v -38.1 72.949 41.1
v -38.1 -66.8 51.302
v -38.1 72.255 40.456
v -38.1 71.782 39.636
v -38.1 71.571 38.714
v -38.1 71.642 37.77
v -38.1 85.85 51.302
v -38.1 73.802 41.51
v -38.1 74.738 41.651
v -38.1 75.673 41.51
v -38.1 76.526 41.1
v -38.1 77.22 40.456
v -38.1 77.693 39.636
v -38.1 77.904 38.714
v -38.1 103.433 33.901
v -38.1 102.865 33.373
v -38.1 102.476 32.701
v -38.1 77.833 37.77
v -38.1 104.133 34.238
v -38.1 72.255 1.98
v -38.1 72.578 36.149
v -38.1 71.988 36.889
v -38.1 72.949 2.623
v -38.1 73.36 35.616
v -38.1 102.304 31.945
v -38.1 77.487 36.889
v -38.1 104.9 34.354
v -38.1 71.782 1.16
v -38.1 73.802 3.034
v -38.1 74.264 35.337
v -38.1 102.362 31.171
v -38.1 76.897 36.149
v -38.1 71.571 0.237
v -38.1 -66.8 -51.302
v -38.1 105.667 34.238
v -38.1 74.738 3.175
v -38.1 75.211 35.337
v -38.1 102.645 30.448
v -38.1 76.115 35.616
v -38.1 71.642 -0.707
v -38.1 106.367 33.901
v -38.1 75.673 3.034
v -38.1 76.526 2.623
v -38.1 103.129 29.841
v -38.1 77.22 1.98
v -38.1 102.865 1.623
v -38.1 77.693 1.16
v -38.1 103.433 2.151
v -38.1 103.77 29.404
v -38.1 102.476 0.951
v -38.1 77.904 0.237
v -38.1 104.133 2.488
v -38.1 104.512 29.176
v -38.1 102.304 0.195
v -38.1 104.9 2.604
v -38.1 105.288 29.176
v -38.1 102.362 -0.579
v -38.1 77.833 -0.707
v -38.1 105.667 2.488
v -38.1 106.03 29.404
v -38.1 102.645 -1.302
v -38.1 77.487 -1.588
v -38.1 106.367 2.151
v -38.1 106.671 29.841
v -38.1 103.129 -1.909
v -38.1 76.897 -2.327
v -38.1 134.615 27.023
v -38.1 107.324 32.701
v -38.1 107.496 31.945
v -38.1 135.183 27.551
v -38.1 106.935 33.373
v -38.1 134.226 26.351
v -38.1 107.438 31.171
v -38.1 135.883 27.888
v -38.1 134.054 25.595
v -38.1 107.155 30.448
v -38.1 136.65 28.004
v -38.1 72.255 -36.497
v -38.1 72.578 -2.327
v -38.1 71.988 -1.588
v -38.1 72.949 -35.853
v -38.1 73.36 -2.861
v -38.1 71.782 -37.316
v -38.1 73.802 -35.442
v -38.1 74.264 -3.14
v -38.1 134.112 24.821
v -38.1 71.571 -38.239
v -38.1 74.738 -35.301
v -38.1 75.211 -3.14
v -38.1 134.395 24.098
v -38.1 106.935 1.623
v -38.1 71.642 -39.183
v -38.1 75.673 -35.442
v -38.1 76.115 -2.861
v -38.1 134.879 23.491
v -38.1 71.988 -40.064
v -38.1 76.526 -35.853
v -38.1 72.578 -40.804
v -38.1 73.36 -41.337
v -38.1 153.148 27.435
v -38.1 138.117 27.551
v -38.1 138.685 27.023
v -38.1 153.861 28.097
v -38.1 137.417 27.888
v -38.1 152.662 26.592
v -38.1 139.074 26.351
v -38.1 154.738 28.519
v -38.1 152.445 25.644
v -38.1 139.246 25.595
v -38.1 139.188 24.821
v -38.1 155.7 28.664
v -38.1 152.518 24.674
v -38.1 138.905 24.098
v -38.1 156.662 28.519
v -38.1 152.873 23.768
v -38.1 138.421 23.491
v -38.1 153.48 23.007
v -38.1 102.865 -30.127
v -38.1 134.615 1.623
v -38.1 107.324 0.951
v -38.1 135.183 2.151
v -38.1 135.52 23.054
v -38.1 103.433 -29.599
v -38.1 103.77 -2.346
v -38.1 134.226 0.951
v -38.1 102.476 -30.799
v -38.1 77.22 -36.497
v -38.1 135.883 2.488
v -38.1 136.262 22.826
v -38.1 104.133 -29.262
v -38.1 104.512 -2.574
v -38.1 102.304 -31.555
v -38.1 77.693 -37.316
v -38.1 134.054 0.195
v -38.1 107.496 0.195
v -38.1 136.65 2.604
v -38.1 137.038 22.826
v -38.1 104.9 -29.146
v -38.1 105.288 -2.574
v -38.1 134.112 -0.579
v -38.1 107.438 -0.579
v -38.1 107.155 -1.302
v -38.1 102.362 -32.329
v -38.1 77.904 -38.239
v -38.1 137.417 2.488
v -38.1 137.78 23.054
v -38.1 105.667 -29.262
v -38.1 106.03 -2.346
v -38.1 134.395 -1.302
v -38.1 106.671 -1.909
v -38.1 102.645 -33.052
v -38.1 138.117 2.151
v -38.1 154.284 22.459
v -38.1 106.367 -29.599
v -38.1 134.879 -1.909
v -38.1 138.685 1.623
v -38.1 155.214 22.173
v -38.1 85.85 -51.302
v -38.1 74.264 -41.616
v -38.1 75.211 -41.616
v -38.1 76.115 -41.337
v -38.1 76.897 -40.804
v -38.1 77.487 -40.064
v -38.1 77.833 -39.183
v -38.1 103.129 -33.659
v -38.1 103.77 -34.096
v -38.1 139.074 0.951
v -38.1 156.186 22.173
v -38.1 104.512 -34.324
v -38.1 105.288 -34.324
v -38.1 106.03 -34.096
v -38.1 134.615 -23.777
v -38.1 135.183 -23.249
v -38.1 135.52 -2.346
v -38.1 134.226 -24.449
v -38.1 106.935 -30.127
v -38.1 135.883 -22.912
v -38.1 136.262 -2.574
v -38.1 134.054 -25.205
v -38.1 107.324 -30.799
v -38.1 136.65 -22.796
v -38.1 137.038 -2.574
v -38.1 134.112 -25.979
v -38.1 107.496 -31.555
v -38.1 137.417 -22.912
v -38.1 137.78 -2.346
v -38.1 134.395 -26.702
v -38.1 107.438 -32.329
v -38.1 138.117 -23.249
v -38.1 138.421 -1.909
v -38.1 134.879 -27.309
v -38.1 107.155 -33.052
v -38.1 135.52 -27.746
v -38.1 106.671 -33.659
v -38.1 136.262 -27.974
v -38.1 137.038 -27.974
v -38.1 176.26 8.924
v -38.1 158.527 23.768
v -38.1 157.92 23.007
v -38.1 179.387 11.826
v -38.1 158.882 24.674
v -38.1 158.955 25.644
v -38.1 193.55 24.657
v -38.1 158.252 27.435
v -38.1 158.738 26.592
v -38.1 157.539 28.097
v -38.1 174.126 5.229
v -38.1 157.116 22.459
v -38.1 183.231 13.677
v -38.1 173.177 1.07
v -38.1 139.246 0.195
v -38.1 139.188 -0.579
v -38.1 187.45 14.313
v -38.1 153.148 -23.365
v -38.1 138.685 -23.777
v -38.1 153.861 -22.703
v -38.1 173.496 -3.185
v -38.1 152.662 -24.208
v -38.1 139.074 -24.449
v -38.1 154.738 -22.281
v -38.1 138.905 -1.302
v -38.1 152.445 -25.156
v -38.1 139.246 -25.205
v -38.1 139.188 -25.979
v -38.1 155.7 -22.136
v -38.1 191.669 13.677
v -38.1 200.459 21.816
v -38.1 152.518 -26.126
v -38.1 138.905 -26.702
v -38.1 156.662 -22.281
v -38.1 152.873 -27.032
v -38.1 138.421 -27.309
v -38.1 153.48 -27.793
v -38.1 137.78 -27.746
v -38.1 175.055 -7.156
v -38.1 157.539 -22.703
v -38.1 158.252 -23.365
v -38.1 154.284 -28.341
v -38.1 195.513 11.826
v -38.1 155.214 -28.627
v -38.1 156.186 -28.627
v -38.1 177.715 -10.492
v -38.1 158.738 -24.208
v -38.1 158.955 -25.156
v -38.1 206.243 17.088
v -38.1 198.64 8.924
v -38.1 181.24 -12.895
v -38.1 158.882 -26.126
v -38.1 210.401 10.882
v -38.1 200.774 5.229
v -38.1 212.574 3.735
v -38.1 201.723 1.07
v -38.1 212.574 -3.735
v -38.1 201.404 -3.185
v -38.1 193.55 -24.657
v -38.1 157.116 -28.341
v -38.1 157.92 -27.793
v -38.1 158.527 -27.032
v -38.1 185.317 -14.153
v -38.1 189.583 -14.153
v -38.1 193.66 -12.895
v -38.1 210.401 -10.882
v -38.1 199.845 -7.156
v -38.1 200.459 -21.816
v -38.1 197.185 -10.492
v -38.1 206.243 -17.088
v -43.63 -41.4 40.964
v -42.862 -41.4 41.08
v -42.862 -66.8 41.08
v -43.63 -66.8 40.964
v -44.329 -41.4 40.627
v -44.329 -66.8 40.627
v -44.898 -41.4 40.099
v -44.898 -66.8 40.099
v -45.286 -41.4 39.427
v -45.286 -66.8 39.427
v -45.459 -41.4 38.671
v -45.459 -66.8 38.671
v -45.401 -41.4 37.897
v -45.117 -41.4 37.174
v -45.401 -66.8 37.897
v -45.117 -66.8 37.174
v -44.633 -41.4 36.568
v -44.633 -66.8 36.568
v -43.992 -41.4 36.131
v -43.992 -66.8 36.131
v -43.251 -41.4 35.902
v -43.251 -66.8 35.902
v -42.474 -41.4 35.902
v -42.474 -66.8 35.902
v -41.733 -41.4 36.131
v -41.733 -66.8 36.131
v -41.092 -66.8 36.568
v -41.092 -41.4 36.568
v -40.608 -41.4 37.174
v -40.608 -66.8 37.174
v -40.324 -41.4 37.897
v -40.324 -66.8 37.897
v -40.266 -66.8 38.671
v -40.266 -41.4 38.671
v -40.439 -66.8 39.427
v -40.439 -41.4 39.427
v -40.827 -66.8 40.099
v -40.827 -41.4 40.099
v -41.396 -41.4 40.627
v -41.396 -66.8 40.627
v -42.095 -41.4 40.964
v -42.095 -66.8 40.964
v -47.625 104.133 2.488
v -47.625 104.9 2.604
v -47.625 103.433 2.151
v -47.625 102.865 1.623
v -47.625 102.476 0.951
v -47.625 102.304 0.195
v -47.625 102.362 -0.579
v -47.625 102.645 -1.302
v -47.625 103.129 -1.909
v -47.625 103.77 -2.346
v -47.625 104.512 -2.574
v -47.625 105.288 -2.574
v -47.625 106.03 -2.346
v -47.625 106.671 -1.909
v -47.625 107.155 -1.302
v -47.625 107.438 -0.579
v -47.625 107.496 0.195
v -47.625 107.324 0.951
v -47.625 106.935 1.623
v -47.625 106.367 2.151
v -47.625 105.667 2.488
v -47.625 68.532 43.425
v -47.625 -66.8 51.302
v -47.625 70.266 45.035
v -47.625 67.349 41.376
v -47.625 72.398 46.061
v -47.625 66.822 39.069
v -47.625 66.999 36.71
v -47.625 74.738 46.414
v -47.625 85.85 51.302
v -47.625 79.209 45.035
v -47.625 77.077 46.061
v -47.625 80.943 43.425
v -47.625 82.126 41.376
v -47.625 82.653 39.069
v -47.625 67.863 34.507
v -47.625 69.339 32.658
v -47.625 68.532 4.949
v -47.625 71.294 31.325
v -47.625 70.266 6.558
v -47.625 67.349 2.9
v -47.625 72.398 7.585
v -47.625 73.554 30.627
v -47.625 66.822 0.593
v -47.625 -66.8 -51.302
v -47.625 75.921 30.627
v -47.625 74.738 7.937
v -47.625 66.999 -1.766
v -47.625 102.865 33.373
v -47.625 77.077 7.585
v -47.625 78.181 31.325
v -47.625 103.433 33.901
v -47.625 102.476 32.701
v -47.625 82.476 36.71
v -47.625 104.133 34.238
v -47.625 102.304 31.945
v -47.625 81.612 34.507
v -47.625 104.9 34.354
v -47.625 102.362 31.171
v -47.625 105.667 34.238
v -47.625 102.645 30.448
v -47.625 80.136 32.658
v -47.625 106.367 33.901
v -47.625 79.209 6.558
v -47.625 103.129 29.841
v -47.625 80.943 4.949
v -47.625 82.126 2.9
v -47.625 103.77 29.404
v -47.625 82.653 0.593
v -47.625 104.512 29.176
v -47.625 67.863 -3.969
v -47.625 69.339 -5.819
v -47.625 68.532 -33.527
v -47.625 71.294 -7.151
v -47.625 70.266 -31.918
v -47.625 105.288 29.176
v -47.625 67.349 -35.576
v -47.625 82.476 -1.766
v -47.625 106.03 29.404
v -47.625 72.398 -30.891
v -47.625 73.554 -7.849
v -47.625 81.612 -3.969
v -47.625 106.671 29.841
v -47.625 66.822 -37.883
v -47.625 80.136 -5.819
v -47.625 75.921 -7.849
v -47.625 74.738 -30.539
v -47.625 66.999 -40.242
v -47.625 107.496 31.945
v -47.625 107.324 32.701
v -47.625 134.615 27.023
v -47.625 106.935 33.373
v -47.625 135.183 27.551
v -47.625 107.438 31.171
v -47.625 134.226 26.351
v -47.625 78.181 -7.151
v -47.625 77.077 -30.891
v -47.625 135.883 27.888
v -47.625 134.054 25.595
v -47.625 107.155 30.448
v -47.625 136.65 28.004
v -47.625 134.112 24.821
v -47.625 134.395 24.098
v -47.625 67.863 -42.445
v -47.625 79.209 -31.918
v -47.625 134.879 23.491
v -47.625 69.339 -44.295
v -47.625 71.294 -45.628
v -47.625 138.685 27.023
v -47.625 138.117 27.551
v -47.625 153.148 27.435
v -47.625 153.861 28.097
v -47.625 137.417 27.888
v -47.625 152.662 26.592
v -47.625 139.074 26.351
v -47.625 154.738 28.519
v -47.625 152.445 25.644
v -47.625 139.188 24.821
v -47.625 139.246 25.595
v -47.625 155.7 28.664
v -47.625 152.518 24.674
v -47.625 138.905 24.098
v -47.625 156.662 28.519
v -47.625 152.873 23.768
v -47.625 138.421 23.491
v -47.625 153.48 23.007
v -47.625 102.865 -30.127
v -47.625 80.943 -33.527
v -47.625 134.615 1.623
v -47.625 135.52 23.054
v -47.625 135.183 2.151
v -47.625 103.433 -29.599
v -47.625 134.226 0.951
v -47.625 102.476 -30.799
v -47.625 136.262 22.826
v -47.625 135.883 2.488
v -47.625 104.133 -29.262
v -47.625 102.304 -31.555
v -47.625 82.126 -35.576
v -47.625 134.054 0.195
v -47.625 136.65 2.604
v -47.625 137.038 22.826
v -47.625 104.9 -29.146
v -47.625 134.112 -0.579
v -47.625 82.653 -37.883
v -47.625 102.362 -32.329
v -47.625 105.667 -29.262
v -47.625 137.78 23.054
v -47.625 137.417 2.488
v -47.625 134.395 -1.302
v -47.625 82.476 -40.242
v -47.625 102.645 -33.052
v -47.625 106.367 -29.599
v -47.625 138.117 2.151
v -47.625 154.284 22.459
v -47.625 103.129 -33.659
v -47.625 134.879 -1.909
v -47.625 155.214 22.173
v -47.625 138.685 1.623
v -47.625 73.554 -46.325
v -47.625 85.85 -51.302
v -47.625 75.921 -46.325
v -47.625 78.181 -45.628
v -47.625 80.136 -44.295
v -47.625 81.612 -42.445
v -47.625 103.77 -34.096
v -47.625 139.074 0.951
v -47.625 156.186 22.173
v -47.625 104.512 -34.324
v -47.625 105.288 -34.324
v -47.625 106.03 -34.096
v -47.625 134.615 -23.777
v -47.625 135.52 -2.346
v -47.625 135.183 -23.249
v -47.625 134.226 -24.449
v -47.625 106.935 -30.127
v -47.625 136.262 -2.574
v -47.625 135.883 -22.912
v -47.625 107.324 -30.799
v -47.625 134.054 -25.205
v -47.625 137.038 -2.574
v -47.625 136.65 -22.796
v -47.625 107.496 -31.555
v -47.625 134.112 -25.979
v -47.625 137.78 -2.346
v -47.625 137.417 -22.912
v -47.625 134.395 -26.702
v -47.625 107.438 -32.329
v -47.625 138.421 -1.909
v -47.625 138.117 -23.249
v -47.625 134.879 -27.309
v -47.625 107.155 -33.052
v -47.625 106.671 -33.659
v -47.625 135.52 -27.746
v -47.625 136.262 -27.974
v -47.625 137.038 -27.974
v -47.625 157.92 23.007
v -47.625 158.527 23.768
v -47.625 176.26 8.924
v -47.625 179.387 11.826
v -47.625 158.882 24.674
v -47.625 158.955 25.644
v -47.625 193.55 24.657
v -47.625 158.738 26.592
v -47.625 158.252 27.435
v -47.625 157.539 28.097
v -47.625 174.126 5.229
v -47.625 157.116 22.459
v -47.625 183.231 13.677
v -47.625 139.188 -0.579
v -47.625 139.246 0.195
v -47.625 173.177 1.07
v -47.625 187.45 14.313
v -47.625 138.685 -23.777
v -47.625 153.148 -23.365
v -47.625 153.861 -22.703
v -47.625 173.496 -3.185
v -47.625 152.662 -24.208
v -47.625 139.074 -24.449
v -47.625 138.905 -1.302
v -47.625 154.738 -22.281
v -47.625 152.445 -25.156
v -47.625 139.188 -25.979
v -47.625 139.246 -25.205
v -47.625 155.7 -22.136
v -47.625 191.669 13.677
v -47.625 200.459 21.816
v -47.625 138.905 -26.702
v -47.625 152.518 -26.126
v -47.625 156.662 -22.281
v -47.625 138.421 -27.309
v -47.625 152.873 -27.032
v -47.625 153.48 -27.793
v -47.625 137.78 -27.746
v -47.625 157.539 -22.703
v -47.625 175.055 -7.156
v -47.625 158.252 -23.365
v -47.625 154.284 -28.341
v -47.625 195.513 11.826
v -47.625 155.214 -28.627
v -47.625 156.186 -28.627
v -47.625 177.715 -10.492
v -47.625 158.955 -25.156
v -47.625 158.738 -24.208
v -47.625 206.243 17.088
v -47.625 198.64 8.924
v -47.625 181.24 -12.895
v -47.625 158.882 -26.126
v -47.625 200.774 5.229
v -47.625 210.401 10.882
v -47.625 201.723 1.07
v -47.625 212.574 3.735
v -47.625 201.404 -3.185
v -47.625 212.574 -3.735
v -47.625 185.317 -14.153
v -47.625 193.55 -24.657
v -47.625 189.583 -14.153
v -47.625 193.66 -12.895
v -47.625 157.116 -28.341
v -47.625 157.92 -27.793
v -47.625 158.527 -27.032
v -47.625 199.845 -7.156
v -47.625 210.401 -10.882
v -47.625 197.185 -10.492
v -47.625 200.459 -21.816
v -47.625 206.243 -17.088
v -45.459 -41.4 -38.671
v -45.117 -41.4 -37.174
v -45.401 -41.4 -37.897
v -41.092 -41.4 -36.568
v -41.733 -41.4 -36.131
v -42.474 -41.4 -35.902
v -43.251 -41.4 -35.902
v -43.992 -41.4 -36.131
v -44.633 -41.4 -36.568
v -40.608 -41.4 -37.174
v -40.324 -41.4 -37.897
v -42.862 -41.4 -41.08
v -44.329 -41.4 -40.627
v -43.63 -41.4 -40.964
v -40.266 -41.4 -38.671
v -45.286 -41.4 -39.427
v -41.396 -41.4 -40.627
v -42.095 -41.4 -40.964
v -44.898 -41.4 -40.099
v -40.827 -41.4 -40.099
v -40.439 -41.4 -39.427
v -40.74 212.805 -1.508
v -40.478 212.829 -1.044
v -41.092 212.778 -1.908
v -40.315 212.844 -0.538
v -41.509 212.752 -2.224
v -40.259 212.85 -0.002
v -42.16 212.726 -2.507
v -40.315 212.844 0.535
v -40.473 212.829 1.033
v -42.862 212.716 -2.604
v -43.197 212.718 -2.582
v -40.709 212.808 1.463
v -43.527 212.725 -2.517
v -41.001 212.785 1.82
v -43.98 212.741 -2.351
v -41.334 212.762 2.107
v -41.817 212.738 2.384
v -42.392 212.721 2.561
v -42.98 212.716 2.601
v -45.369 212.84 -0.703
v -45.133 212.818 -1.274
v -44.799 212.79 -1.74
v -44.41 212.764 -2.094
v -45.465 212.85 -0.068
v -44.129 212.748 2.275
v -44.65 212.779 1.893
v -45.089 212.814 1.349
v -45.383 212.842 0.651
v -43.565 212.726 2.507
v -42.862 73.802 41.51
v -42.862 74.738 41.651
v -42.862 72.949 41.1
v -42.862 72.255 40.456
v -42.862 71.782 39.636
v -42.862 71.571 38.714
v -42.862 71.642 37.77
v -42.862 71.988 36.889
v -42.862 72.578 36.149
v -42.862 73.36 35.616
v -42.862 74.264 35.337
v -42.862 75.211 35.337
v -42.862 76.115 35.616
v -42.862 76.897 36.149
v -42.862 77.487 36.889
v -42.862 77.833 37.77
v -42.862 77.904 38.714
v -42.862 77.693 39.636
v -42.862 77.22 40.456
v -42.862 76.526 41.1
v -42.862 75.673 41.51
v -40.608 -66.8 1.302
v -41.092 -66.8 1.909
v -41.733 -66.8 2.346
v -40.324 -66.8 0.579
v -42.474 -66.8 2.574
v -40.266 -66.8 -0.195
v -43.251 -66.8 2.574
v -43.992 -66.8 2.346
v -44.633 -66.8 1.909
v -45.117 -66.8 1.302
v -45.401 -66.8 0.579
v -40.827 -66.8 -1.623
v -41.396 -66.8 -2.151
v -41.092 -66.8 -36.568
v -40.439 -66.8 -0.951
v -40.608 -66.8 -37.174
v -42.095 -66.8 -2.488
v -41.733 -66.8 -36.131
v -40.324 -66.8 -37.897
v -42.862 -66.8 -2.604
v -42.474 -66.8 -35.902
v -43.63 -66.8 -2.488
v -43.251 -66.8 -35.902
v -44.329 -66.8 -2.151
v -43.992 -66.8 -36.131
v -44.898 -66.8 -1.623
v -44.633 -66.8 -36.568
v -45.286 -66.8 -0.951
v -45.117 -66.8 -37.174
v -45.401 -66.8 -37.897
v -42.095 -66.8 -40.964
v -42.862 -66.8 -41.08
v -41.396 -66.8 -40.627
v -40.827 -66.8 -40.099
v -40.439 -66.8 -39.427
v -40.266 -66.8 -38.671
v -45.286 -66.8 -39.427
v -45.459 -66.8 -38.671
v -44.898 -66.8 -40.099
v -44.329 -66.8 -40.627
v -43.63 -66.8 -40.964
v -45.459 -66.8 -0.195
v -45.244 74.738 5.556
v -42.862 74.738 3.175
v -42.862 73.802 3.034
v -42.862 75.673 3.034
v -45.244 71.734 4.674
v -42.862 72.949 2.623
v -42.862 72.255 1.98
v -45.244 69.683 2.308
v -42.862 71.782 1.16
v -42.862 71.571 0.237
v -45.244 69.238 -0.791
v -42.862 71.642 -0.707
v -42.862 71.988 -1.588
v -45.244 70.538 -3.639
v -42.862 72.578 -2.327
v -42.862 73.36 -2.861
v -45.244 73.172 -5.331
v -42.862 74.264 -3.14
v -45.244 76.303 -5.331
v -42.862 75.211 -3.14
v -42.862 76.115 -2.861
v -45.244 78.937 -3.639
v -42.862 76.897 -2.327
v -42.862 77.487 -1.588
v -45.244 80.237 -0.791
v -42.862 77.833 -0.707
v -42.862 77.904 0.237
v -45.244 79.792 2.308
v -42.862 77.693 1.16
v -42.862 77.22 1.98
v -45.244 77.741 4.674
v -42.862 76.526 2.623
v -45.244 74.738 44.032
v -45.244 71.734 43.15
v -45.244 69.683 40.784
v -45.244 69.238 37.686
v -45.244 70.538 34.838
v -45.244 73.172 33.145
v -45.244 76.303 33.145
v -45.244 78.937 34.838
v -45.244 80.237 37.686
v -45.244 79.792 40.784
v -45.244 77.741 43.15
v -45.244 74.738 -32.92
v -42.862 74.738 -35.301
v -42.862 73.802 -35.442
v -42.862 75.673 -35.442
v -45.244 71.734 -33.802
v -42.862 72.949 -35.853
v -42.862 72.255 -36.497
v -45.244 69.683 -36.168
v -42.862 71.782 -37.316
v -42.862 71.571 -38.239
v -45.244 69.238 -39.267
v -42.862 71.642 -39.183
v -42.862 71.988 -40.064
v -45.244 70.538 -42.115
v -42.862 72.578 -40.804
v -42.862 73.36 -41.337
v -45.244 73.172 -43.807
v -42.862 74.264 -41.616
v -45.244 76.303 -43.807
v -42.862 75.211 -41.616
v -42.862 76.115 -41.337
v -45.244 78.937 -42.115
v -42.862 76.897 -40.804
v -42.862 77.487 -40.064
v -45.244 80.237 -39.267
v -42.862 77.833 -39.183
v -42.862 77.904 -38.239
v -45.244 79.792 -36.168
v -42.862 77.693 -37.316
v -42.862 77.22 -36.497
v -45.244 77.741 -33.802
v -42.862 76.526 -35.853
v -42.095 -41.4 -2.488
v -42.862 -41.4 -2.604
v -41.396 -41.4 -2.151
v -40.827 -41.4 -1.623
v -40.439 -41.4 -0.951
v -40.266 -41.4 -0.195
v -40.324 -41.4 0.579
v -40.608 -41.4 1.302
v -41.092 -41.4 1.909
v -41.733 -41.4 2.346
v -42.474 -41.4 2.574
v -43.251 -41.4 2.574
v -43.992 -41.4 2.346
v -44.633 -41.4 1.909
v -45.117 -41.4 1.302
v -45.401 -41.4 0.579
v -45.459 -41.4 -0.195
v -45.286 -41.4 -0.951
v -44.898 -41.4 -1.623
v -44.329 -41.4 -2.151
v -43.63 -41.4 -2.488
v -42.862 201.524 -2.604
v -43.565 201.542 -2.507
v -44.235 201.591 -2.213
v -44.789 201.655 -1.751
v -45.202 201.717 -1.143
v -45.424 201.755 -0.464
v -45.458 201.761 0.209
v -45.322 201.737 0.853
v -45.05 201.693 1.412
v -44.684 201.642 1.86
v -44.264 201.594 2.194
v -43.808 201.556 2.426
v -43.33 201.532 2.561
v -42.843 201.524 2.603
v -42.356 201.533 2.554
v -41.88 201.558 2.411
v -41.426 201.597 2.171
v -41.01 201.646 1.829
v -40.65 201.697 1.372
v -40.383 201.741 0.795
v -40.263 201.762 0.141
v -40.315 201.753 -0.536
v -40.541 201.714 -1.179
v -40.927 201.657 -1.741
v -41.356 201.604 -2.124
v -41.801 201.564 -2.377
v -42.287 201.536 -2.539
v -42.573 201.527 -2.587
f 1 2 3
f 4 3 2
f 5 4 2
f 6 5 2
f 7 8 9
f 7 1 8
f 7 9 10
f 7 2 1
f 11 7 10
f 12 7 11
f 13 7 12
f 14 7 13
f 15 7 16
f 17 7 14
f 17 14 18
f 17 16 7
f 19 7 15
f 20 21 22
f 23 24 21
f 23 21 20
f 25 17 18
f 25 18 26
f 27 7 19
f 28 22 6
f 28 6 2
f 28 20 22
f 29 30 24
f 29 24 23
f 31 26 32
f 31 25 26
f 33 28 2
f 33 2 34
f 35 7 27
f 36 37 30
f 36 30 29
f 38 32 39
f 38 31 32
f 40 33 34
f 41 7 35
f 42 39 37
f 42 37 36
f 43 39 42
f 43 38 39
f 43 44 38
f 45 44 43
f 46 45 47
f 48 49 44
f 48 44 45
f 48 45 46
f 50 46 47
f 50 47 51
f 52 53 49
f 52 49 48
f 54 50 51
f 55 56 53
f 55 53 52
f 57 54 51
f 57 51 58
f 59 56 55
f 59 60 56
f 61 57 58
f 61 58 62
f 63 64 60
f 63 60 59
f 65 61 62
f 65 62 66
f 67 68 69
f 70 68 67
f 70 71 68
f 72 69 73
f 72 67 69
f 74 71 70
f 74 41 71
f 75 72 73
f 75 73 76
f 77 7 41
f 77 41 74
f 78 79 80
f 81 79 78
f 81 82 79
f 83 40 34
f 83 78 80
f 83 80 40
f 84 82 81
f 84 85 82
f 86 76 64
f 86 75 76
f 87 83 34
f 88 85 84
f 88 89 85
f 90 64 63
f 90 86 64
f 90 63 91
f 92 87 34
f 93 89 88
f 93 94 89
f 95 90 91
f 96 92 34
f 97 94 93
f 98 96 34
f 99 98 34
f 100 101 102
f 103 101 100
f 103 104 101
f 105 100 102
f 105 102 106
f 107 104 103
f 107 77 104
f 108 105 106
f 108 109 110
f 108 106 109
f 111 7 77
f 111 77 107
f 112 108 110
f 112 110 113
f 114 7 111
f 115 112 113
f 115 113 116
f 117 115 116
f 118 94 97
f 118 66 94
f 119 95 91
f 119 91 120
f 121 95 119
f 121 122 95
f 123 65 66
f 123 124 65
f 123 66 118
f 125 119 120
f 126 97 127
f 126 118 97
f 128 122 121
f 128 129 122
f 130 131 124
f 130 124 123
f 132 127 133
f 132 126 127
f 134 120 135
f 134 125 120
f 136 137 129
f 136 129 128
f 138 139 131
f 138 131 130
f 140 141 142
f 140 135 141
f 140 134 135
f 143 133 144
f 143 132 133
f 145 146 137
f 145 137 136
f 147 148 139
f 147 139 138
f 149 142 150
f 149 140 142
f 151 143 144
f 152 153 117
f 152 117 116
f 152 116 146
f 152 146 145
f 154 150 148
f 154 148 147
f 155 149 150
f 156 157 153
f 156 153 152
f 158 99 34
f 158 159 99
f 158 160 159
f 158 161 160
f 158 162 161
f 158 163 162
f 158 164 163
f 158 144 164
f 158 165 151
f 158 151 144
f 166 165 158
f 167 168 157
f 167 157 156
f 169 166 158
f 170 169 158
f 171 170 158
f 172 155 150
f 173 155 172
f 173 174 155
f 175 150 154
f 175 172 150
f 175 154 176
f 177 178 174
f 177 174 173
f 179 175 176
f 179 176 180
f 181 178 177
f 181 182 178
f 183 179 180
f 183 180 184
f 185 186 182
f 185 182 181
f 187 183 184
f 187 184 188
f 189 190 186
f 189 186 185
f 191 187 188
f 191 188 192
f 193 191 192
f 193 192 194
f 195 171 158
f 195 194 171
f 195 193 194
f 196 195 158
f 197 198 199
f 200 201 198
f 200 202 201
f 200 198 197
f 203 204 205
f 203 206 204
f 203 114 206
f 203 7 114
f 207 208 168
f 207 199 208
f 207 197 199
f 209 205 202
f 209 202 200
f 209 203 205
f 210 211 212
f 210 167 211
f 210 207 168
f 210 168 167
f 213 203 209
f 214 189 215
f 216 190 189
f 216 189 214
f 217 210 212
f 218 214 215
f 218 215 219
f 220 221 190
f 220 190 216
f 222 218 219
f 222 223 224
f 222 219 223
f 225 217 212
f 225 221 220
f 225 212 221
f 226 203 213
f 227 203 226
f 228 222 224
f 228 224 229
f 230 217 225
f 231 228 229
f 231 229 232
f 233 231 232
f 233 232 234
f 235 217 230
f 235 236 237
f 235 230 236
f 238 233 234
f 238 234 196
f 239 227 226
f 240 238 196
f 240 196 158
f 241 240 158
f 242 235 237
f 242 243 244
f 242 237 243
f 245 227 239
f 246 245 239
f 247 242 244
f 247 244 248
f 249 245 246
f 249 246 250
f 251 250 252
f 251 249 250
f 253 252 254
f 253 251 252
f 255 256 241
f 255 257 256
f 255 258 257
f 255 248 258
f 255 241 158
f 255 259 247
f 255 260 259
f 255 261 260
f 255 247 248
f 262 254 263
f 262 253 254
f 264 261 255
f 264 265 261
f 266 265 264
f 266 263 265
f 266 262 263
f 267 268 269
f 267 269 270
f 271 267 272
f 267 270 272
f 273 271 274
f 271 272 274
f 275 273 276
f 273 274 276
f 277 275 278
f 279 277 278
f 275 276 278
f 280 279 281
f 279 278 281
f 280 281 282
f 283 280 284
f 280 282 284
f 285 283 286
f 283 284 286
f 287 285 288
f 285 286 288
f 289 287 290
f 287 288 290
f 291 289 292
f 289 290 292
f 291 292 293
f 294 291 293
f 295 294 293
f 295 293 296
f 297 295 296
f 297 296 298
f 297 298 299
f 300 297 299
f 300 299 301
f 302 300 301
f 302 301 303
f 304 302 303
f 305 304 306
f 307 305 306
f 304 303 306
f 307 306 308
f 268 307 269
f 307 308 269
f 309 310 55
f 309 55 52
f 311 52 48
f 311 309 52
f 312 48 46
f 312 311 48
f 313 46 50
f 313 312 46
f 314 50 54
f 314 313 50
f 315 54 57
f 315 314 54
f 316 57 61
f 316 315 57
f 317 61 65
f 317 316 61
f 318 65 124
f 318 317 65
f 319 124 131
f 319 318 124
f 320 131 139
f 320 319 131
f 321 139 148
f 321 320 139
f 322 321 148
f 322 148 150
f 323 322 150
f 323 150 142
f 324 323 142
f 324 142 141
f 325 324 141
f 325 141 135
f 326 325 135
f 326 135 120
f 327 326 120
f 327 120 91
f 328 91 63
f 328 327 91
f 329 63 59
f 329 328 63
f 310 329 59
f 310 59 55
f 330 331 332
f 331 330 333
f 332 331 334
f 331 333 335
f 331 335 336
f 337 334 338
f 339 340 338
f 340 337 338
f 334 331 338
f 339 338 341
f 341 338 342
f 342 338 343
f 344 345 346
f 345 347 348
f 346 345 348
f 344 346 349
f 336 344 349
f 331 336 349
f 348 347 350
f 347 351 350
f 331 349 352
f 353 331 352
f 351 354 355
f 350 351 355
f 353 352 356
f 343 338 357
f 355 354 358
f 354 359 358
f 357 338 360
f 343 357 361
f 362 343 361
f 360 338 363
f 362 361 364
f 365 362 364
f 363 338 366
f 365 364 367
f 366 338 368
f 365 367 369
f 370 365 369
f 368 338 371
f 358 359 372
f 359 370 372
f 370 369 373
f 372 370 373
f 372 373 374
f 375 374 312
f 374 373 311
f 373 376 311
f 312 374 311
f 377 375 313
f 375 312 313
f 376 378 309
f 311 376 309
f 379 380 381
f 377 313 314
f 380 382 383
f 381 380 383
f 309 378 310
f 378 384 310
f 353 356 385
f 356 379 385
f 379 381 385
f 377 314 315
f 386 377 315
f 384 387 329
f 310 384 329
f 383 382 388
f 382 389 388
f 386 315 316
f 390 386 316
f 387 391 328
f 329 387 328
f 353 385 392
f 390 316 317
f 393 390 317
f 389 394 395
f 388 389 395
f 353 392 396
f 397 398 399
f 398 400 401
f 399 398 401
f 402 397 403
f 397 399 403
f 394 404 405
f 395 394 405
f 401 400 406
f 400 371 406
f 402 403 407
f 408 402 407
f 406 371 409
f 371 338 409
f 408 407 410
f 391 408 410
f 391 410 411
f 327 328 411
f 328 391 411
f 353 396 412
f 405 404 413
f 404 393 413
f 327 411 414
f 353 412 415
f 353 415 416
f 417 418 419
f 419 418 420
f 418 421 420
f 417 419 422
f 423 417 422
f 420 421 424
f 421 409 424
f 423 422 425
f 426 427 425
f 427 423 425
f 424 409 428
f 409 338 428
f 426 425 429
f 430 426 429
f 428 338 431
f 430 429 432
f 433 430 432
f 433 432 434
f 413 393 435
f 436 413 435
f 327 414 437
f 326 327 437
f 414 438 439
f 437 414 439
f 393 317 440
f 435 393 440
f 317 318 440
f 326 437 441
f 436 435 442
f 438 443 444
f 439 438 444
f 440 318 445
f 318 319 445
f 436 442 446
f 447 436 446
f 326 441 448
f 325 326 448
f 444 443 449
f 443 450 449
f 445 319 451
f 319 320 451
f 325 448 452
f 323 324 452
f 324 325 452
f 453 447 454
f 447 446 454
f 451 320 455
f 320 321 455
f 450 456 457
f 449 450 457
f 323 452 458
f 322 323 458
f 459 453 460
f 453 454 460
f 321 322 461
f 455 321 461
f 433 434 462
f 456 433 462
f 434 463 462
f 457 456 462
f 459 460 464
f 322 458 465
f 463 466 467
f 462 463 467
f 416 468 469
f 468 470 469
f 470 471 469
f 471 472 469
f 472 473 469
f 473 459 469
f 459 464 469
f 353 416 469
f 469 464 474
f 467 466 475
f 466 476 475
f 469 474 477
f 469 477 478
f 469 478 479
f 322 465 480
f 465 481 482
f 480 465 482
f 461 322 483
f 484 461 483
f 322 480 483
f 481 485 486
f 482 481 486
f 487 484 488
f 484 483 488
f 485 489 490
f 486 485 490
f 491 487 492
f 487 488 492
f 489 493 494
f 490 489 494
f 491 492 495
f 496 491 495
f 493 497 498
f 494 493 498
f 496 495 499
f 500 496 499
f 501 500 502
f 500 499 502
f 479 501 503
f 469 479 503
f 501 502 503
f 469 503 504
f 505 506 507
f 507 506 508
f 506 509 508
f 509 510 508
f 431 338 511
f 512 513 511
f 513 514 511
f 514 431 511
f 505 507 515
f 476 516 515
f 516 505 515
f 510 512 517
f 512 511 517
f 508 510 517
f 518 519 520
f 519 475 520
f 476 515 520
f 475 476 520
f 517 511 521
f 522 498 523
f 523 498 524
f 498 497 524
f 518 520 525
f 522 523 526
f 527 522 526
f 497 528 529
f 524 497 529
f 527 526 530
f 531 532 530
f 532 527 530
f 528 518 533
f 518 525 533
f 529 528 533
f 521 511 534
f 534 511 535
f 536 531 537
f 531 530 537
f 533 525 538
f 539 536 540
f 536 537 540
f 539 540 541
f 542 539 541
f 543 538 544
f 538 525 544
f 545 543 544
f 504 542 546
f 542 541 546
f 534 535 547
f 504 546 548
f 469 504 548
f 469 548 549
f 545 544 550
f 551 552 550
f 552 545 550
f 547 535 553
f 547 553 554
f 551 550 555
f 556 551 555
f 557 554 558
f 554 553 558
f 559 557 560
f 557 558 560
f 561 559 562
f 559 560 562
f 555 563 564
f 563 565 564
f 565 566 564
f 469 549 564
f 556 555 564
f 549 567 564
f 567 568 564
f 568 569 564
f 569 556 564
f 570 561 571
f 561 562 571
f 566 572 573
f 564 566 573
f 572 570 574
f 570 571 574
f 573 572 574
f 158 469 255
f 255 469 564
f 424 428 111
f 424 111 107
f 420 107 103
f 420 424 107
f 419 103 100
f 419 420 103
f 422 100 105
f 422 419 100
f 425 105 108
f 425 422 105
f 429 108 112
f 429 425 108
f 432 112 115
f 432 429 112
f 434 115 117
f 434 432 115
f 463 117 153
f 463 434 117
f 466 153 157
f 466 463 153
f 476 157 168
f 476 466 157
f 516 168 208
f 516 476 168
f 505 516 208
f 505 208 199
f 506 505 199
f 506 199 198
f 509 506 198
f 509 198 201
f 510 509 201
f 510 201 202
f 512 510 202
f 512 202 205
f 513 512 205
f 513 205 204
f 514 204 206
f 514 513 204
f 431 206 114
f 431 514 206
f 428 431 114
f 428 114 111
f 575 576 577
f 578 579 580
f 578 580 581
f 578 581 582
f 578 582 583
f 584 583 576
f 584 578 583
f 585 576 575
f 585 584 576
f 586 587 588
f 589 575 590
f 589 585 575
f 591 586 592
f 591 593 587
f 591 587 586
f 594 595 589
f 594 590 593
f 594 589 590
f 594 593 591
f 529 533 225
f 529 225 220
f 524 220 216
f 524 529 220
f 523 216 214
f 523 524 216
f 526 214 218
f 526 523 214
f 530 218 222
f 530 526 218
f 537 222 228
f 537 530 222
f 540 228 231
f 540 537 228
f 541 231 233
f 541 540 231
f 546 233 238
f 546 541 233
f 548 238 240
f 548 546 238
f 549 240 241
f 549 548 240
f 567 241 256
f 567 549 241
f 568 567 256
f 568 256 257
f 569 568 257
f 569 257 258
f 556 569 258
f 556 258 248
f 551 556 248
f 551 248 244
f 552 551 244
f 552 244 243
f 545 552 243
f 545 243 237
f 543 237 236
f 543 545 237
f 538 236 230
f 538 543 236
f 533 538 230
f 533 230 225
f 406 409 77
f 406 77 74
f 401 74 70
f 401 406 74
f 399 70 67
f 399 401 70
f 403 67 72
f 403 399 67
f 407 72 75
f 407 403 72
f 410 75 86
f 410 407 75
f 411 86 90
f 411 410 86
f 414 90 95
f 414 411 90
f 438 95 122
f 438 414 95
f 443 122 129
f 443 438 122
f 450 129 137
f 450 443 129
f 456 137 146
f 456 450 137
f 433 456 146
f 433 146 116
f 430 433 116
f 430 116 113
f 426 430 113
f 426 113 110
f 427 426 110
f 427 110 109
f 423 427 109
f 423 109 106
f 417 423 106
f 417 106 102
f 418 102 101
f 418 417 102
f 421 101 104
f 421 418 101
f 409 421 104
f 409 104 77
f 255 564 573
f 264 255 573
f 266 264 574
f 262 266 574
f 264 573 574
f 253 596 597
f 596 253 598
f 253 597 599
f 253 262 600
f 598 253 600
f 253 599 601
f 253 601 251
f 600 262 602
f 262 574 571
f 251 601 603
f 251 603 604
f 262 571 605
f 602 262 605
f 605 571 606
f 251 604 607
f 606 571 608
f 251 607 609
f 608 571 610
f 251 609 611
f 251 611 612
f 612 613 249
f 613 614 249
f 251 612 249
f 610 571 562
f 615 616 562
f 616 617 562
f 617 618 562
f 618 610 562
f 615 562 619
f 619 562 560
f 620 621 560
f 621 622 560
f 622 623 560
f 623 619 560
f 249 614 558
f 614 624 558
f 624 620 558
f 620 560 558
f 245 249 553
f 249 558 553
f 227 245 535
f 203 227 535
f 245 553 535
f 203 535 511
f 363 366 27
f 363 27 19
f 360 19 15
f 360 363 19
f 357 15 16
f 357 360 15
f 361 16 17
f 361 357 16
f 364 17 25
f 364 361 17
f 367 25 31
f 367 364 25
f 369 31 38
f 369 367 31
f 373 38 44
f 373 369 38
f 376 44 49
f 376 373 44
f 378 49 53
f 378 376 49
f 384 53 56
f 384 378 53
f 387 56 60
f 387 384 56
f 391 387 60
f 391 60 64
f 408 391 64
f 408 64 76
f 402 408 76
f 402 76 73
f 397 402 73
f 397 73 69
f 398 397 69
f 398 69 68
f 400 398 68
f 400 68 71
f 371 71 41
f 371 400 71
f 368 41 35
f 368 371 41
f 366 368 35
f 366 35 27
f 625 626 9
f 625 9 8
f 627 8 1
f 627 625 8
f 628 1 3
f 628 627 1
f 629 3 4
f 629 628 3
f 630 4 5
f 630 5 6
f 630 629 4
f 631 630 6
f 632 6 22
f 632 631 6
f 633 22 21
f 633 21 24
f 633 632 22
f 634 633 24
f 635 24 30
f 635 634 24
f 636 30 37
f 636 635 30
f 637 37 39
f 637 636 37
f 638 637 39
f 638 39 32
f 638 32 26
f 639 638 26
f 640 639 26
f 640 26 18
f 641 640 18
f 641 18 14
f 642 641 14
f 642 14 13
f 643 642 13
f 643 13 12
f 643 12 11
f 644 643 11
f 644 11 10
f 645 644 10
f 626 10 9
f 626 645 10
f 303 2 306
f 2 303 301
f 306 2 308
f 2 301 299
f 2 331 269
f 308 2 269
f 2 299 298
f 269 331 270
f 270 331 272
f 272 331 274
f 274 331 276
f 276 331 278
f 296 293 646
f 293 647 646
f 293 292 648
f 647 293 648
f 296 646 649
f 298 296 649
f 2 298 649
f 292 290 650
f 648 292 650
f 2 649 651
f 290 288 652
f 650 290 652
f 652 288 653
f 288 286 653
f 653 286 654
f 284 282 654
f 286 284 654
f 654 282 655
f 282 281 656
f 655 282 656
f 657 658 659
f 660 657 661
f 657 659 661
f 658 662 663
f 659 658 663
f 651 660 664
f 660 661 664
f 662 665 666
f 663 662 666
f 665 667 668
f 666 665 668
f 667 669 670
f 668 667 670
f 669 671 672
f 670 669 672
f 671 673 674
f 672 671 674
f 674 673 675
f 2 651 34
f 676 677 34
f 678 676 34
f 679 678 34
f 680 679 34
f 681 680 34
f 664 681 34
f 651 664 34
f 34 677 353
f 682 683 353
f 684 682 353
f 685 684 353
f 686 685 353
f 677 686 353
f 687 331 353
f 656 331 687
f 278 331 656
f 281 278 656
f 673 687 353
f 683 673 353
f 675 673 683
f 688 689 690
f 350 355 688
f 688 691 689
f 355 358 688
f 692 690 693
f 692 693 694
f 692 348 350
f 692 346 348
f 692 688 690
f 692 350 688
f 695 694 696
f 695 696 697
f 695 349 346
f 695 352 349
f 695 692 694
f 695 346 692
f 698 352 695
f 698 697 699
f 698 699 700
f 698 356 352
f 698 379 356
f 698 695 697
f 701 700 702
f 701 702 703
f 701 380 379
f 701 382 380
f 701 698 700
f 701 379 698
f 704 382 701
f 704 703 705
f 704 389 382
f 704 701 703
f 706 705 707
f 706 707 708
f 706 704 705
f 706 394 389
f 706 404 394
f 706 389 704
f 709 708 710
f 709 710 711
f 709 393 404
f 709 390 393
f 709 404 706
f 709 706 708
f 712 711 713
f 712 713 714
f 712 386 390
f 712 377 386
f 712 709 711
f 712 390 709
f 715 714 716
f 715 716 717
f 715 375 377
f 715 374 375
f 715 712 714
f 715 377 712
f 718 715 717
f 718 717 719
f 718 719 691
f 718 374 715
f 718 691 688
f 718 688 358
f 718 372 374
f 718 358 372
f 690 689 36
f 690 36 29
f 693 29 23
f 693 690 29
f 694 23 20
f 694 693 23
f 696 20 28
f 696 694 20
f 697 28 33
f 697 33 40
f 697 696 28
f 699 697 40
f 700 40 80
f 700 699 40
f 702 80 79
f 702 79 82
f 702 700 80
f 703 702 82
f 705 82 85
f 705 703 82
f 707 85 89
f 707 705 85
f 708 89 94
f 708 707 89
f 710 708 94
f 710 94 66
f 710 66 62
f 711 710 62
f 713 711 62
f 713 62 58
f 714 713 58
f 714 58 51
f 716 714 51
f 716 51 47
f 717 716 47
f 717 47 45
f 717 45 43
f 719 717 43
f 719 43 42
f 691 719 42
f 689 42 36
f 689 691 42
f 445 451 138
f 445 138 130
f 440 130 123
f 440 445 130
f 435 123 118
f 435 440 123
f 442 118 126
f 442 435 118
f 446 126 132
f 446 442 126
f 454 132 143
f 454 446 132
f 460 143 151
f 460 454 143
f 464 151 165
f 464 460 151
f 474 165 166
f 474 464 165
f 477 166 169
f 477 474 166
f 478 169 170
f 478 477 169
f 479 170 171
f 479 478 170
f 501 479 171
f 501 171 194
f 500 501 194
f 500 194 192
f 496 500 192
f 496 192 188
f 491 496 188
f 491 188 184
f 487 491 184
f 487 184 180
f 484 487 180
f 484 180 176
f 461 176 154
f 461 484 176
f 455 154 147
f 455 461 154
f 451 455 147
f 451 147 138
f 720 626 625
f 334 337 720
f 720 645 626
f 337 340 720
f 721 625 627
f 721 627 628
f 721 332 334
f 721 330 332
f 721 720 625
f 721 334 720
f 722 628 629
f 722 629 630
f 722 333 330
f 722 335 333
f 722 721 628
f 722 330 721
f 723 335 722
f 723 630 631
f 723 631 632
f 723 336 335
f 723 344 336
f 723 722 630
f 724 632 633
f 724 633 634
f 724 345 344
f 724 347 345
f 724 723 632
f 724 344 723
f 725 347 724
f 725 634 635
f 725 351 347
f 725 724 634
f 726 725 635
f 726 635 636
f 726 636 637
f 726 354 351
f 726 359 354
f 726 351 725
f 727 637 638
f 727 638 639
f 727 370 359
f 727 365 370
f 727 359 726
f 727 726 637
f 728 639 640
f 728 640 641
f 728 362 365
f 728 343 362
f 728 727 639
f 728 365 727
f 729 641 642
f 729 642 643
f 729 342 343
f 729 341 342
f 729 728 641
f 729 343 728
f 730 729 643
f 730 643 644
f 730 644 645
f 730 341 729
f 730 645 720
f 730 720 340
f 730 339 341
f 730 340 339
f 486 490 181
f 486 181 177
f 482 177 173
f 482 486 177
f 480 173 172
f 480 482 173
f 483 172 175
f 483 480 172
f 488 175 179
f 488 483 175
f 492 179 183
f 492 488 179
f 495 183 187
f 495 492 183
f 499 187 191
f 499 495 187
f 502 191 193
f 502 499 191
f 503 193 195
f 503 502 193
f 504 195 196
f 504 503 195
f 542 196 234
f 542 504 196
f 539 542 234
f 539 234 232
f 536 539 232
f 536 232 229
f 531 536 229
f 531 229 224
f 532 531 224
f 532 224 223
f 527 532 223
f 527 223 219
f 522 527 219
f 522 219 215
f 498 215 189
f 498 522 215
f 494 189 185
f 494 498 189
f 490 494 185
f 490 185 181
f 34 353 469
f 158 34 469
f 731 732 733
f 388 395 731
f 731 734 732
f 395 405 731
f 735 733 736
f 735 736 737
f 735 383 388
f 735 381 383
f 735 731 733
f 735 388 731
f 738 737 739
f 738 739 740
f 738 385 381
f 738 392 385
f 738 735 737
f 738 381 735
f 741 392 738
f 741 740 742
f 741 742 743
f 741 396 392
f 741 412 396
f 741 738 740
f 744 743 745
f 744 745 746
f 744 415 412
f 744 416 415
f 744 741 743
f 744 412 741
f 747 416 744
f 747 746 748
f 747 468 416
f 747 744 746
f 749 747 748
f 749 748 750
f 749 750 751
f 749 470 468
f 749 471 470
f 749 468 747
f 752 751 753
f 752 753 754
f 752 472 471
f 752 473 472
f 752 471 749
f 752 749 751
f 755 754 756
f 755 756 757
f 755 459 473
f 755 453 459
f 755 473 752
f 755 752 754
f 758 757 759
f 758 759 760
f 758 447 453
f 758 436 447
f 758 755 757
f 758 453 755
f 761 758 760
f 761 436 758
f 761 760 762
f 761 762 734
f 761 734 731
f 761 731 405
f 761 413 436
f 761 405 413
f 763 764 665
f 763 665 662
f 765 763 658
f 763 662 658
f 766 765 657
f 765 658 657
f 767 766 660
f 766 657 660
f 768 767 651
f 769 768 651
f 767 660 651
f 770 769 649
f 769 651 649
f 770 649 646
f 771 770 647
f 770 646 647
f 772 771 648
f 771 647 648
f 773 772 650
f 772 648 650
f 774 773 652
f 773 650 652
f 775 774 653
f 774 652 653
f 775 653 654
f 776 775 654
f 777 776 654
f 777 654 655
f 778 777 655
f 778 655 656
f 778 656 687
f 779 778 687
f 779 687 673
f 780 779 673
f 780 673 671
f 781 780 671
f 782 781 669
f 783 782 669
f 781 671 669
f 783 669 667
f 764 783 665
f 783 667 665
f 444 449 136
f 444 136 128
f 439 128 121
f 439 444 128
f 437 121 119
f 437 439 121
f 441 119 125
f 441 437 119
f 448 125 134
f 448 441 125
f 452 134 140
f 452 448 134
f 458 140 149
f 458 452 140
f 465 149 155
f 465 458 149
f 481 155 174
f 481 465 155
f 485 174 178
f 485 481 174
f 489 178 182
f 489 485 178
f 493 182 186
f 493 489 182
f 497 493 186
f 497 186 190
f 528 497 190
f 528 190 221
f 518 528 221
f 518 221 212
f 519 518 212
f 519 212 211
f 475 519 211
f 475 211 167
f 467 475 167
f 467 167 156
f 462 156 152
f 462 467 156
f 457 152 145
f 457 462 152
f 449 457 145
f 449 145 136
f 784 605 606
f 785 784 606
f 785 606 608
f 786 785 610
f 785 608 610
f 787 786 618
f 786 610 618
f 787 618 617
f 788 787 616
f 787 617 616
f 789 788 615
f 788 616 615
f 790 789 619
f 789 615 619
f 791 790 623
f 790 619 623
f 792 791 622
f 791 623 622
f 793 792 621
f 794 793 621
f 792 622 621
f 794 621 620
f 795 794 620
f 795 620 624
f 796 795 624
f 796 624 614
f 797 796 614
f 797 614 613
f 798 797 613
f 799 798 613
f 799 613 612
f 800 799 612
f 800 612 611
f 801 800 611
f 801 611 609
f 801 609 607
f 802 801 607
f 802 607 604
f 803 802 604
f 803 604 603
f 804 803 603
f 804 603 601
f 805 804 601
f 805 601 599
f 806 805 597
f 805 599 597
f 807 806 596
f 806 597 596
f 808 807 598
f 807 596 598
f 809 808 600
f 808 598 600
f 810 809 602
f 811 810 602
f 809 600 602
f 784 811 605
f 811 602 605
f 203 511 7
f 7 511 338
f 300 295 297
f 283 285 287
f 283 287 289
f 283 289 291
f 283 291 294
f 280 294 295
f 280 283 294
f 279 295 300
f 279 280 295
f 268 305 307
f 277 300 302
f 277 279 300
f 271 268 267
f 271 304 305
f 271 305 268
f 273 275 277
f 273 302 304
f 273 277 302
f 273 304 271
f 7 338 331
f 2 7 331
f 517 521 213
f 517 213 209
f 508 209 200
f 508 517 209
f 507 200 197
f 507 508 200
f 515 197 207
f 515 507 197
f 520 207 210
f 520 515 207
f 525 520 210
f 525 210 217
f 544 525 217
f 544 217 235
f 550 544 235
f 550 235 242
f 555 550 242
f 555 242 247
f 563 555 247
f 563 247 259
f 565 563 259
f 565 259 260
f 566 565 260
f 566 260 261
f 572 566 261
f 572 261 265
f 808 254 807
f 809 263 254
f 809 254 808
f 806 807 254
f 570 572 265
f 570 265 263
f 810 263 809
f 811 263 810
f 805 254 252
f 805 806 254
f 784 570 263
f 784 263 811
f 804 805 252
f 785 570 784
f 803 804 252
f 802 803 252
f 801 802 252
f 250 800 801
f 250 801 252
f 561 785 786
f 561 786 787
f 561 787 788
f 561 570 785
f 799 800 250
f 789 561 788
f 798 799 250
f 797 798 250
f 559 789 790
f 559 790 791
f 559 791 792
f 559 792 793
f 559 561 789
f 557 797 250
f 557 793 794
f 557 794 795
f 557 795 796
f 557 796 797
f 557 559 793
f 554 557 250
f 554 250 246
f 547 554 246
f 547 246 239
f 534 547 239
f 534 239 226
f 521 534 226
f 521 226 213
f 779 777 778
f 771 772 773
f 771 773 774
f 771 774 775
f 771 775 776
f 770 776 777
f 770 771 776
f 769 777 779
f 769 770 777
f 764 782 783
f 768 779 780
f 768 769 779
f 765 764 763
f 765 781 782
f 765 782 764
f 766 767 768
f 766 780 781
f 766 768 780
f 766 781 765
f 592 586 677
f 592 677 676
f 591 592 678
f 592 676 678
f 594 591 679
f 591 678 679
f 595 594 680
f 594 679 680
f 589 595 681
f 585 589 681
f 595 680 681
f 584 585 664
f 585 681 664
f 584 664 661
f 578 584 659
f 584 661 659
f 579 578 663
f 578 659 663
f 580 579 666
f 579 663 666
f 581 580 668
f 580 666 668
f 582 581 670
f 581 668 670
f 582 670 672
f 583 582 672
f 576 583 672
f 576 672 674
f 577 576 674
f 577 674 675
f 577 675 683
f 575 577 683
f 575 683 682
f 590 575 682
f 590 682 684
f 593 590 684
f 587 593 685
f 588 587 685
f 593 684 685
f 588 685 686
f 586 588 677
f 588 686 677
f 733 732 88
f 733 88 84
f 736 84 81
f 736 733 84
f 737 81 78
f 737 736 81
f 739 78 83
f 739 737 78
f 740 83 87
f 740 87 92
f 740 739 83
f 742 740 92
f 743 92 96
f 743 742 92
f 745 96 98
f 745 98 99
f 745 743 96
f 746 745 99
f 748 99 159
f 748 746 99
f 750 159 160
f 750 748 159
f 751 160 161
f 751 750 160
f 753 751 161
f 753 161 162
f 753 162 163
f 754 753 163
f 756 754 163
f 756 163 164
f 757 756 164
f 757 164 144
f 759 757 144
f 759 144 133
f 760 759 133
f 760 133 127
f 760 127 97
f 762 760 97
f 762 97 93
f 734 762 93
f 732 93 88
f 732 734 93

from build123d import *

# Parameters (mm, degrees)
SKETCH2_R               = 14.3129
SKETCH2_R_2             = 3.175
SKETCH2_R_3             = 2.6035
SKETCH2_R_4             = 3.2639
BOSS_EXTRUDE1_DEPTH     = 9.525
CHAMFER1_SIZE           = 4.7625
SKETCH3_R               = 2.6035
CUT_EXTRUDE1_DEPTH      = 25.4
CUT_EXTRUDE2_REACH      = 290.278
CUT_EXTRUDE2_END_RADIUS = 14.3129
SKETCH4_R               = 2.6035


with BuildPart() as part:
    # Sketch2 → Boss-Extrude1 (new body)
    with BuildSketch(Plane(origin=(-47.625, 0, 0), x_dir=(0, 0, -1), z_dir=(1, 0, 0))):
        with BuildLine():
            Line((51.301650802, 73.15), (51.301650802, 85.85))
            Line((51.301650802, 85.85), (24.65662816, 193.550056376))
            ThreePointArc((24.65662816, 193.550056376), (0, 212.85), (-24.65662816, 193.550056376))
            Line((-24.65662816, 193.550056376), (-51.301650802, 85.85))
            Line((-51.301650802, 85.85), (-51.301650802, 73.15))
            Line((-51.301650802, 73.15), (-51.301650802, -66.8))
            Line((-51.301650802, -66.8), (51.301650802, -66.8))
            Line((51.301650802, -66.8), (51.301650802, 73.15))
        make_face()
        with Locations(Location((0, 187.45, 0), (0, 0, 180))):
            Circle(SKETCH2_R, mode=Mode.SUBTRACT)
        with Locations(Location((38.476238101, 74.7375, 0), (0, 0, 180))):
            Circle(SKETCH2_R_2, mode=Mode.SUBTRACT)
        with Locations(Location((0, 74.7375, 0), (0, 0, 180))):
            Circle(SKETCH2_R_2, mode=Mode.SUBTRACT)
        with Locations(Location((-38.476238101, 74.7375, 0), (0, 0, 180))):
            Circle(SKETCH2_R_2, mode=Mode.SUBTRACT)
        with Locations(Location((0, 136.65, 0), (0, 0, 180))):
            Circle(SKETCH2_R_3, mode=Mode.SUBTRACT)
        with Locations(Location((-25.4, 136.65, 0), (0, 0, 180))):
            Circle(SKETCH2_R_3, mode=Mode.SUBTRACT)
        with Locations(Location((-31.75, 104.9, 0), (0, 0, 180))):
            Circle(SKETCH2_R_3, mode=Mode.SUBTRACT)
        with Locations(Location((0, 104.9, 0), (0, 0, 180))):
            Circle(SKETCH2_R_3, mode=Mode.SUBTRACT)
        with Locations(Location((31.75, 104.9, 0), (0, 0, 180))):
            Circle(SKETCH2_R_3, mode=Mode.SUBTRACT)
        with Locations(Location((25.4, 136.65, 0), (0, 0, 180))):
            Circle(SKETCH2_R_3, mode=Mode.SUBTRACT)
        with Locations(Location((-25.4, 155.7, 0), (0, 0, 180))):
            Circle(SKETCH2_R_4, mode=Mode.SUBTRACT)
        with Locations(Location((25.4, 155.7, 0), (0, 0, 180))):
            Circle(SKETCH2_R_4, mode=Mode.SUBTRACT)
    extrude(amount=BOSS_EXTRUDE1_DEPTH)

    # Chamfer1
    chamfer1_edges = [part.edges().sort_by_distance(p)[0] for p in [
        (-47.625, 74.7375, -3.175),
        (-47.625, 74.7375, -41.651238101),
        (-47.625, 74.7375, 35.301238101),
    ]]
    chamfer(chamfer1_edges, length=CHAMFER1_SIZE)

    # Sketch3 → Cut-Extrude1 (cut)
    with BuildSketch(Plane.XZ.offset(66.8)):
        with Locations(Location((-42.8625, -38.476238101, 0), (0, 0, 270))):
            Circle(SKETCH3_R)
        with Locations(Location((-42.8625, 0, 0), (0, 0, 270))):
            Circle(SKETCH3_R)
        with Locations(Location((-42.8625, 38.476238101, 0), (0, 0, 90))):
            Circle(SKETCH3_R)
    extrude(amount=-CUT_EXTRUDE1_DEPTH, mode=Mode.SUBTRACT)

    # Cut-Extrude2: up to this cylinder (the profile starts outside it)
    cut_extrude2_end = Plane(origin=(-42.8625, 187.45, 0), z_dir=(-1, 0, 0)) * Cylinder(CUT_EXTRUDE2_END_RADIUS, 610.1818, mode=Mode.PRIVATE)
    # Sketch4 → Cut-Extrude2 (cut, up to the surface)
    with BuildSketch(Plane(origin=(0, 212.85, 0), x_dir=(-1, 0, 0), z_dir=(0, 1, 0)), mode=Mode.PRIVATE) as cut_extrude2_sk1:
        with Locations(Location((42.8625, 0, 0), (0, 0, 270))):
            Circle(SKETCH4_R)
    cut_extrude2_tool1 = extrude(cut_extrude2_sk1.sketch, amount=-CUT_EXTRUDE2_REACH, mode=Mode.PRIVATE) - cut_extrude2_end
    add(cut_extrude2_tool1.solids().sort_by_distance((-42.8625, 212.85, 0))[0], mode=Mode.SUBTRACT)


solid = part.part
